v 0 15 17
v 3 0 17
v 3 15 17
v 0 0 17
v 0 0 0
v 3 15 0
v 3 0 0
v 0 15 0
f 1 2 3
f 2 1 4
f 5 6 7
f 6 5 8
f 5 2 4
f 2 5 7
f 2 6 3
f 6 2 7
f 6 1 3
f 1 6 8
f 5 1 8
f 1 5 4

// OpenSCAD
// Generated by SolidPython 1.0.1 on 2020-07-29 00:39:26


cube(size = [3, 15, 17]);
/***********************************************
*********      SolidPython code:      **********
************************************************
 
# import packages: SolidPython
from solid import *
from solid.utils import *
from itertools import chain, combinations


class Resize:

    def __init__(self, scad_file):
        self.scad_file = scad_file
        #self.scad_file = import_scad(scad_file)
        # cone/cylinder param:
        self.r1 = 0
        self.r2 = 0
        self.h = 0
        # rectangular prism param:
        self.w = 0
        self.l = 0
        # ellipse param:
        self.r = 0

    # import OpenScad code (file name corresponds to shape)


    # classify shape + parameters
    def assign(self, param1, param2, param3):
        if self.scad_file == 'cone.scad':
            self.r1 = param1
            self.r2 = param2
            self.h = param3
        elif self.scad_file == 'cylinder.scad':
            self.r1 = param1
            self.r2 = param2
            self.h = param3
        elif self.scad_file == 'rectangularPrism.scad':
            self.h = param1
            self.l = param2
            self.w = param3
        else:
            self.r = param1
            self.h = param2

    # resize parameters
    def iterate(self):
        x = range(3, 20, 2)
        i = 1
        if self.scad_file == 'cone.scad':
            tempList = list(combinations(x, 2))
            for temp in tempList:
                param1 = temp[0]
                param2 = temp[1]
                filepath = 'produced_scad_files/' + 'cone' + str(param1) + '_' + str(param2) + '_' + '.scad'
                scad_render_to_file(cylinder(h=param1, r1=param2, r2=0), filepath)

        elif self.scad_file == 'cylinder.scad':
            tempList = list(combinations(x, 3))
            for temp in tempList:
                param1 = temp[0]
                param2 = temp[1]
                filepath = 'produced_scad_files/' + 'cylinder' + str(param1) + '_' + str(param2) + '_' + '.scad'
                scad_render_to_file(cylinder(h=param1, r1=param2, r2=param2), filepath)

        elif self.scad_file == 'rectangularPrism.scad':
            tempList = list(combinations(x, 3))
            for temp in tempList:
                param1 = temp[0]
                param2 = temp[1]
                param3 = temp[2]
                filepath = 'produced_scad_files/' + 'rectangularPrism' + str(param1) + '_' + str(param2) + '_' + str(
                    param3) + '.scad'
                scad_render_to_file(cube(size=(param1, param2, param3)), filepath)

        elif self.scad_file == 'ellipse.scad':
            tempList = list(combinations(x, 4))
            for temp in tempList:
                param1 = temp[0]
                param2 = temp[1]
                param3 = temp[2]
                param4 = temp[3]
                filepath = 'produced_scad_files/' + 'ellipse' + str(param1) + '_' + str(param2) + '_' + str(param3) + '_' + str(param4) + '.scad'
                scad_render_to_file(scale([param1, param2, param3])(sphere(r=param4)), filepath)

    def render_to_scadfile(self):
        scad_render_to_file(scad, 'example.scad') 
 
************************************************/
